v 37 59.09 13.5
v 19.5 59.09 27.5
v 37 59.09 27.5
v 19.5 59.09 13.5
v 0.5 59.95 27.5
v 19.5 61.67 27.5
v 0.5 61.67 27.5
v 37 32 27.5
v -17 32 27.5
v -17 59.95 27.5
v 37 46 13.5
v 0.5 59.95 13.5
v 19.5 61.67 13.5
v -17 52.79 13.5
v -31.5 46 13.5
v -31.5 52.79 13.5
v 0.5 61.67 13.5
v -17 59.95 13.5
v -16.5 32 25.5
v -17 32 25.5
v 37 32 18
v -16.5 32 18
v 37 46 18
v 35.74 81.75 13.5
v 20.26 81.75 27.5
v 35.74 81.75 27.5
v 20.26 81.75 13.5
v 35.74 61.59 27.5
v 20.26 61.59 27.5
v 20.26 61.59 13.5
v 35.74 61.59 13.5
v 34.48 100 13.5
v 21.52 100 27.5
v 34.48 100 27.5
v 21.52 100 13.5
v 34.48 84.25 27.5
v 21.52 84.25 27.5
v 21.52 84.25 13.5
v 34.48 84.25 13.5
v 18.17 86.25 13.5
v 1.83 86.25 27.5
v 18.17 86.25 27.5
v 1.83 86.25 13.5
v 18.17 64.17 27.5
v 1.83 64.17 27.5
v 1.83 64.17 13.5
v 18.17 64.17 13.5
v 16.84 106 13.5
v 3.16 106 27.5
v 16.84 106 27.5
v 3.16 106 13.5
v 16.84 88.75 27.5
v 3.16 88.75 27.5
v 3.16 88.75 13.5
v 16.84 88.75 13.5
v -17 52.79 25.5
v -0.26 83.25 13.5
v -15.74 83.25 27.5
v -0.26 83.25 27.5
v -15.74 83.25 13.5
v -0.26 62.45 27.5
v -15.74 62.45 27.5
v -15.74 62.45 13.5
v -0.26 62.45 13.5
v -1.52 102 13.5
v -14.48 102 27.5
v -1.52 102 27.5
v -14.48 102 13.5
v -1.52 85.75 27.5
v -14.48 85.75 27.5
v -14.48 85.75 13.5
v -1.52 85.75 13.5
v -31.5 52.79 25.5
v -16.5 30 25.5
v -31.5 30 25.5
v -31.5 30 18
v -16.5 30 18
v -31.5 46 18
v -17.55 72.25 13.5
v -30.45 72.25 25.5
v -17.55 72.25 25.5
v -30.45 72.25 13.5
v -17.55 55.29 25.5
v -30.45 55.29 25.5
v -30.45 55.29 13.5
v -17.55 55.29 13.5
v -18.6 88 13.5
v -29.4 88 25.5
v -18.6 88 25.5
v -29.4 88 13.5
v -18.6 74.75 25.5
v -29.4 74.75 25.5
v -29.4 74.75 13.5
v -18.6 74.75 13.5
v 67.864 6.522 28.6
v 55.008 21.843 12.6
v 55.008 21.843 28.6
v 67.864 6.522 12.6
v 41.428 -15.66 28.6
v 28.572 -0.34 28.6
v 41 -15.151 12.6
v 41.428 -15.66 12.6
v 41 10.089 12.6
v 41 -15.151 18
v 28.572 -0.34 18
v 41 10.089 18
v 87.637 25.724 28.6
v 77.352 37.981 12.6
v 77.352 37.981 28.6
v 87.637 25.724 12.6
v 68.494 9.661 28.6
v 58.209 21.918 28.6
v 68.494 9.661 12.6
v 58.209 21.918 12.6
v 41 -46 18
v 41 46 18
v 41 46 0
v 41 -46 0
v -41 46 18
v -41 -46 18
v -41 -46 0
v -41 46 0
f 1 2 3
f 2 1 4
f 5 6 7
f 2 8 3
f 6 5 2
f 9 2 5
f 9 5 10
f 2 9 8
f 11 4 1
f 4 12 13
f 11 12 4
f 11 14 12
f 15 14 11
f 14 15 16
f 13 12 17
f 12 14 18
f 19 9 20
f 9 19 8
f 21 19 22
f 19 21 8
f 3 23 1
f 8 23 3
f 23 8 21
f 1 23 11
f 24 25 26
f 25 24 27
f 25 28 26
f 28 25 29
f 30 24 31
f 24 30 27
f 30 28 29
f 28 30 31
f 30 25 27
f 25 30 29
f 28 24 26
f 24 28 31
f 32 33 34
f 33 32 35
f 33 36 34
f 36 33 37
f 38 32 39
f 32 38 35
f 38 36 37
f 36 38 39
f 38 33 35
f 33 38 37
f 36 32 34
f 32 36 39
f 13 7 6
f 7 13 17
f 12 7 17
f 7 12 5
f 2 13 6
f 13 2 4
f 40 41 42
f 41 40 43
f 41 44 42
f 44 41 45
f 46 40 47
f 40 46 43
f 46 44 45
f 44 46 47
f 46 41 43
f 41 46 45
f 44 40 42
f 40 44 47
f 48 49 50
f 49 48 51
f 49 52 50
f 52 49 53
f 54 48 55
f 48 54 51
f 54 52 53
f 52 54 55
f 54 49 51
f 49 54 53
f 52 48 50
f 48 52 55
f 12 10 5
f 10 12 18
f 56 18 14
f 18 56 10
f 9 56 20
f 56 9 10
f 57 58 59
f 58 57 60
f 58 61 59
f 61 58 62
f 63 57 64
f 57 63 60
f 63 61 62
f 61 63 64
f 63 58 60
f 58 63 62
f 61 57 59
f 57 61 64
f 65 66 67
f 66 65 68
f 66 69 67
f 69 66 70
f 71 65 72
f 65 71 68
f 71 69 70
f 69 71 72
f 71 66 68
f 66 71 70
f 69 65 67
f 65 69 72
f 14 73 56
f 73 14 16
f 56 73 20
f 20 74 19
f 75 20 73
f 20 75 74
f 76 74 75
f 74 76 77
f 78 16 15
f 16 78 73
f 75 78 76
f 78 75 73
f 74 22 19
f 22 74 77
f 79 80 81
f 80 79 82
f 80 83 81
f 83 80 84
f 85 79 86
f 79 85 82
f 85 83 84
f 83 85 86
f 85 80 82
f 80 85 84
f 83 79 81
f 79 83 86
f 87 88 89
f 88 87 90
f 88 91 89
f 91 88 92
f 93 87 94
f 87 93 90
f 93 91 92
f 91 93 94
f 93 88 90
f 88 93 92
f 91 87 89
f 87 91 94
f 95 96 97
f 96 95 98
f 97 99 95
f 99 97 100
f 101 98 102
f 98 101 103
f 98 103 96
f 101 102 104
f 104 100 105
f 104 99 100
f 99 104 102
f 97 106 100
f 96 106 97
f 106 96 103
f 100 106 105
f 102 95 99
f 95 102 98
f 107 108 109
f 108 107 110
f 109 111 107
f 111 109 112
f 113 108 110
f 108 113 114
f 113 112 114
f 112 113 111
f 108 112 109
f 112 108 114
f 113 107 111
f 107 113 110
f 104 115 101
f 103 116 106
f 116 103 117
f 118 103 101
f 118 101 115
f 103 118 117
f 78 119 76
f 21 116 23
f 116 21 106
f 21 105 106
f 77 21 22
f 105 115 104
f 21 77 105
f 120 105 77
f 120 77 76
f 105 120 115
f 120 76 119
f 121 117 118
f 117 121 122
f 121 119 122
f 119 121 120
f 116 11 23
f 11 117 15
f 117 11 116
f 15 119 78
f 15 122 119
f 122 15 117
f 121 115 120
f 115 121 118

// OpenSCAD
// PECHand v1 — Parametric prosthetic hand model
// Generated: 2025-01-15
// Description: Modular hand assembly with configurable palm and digits

/* [Anthropometric] */
palm_width_mm = 82;          // [50:1:120]
palm_length_mm = 92;         // [50:1:140]
palm_thickness_mm = 18;      // [10:1:40]
index_finger_length_mm = 68; // [40:1:120]
middle_finger_length_mm = 74; // [40:1:130]
ring_finger_length_mm = 70;  // [40:1:120]
pinky_finger_length_mm = 58; // [30:1:100]
thumb_length_mm = 62;        // [30:1:100]

/* [Layout] */
show_palm = true;
show_index = true;
show_middle = true;
show_ring = true;
show_pinky = true;
show_thumb = true;
show_assembled = true;
mirrored = false;

/* [Style] */
finger_shape = "box"; // ["box","cylinder"]
segment_gap_mm = 2.5; // [0:0.5:8]
finger_thickness_mm = 14; // [6:1:24]
thumb_thickness_mm = 16;  // [6:1:24]

/* [Colors] */
color_palm   = "#d9b382";
color_index  = "#4a9eff";
color_middle = "#ff6b6b";
color_ring   = "#51cf66";
color_pinky  = "#ffd43b";
color_thumb  = "#f783ac";

$fn = $preview ? 32 : 64;

finger_segment_ratios = [0.43, 0.32, 0.25];
thumb_segment_ratios  = [0.58, 0.42];

function _segment_offset(i, usable_length, segment_ratios, gap) =
    i <= 0 ? 0 :
    _segment_offset(i - 1, usable_length, segment_ratios, gap) +
    usable_length * segment_ratios[i - 1] + gap;

module palm_placeholder() {
    translate([-palm_width_mm / 2, -palm_length_mm / 2, 0])
        cube([palm_width_mm, palm_length_mm, palm_thickness_mm]);
}

module segment_shape(length, width, thickness) {
    if (finger_shape == "cylinder")
        rotate([0, 90, 0])
            cylinder(h=length, r=min(width, thickness) / 2, center=false);
    else
        cube([length, width, thickness]);
}

module segment_chain(total_length, widths, thickness, segment_ratios, gap=segment_gap_mm) {
    _n = len(segment_ratios);
    _gap_total = gap * (_n - 1);
    _usable_length = max(1, total_length - _gap_total);

    for (i = [0:_n - 1]) {
        _seg_len = _usable_length * segment_ratios[i];
        _x = _segment_offset(i, _usable_length, segment_ratios, gap);
        translate([_x, -widths[i] / 2, 0]) segment_shape(_seg_len, widths[i], thickness);
    }
}

module finger_placeholder(total_length, base_width=18, thickness=finger_thickness_mm) {
    _widths = [base_width, base_width * 0.86, base_width * 0.72];
    segment_chain(total_length, _widths, thickness, finger_segment_ratios);
}

module thumb_placeholder(total_length, base_width=20, thickness=thumb_thickness_mm) {
    _widths = [base_width, base_width * 0.8];
    segment_chain(total_length, _widths, thickness, thumb_segment_ratios);
}

module hand_layout() {
    _dir = mirrored ? -1 : 1;
    _base_y = palm_length_mm / 2 - 14;
    _x_index  =  28 * _dir;
    _x_middle =  10 * _dir;
    _x_ring   =  -8 * _dir;
    _x_pinky  = -24 * _dir;

    if (show_palm) color(color_palm) palm_placeholder();

    if (show_index) color(color_index)
        translate([_x_index, _base_y, palm_thickness_mm * 0.75])
            rotate([0, 0, 90]) finger_placeholder(index_finger_length_mm, base_width=18);

    if (show_middle) color(color_middle)
        translate([_x_middle, _base_y, palm_thickness_mm * 0.75])
            rotate([0, 0, 90]) finger_placeholder(middle_finger_length_mm, base_width=19);

    if (show_ring) color(color_ring)
        translate([_x_ring, _base_y, palm_thickness_mm * 0.75])
            rotate([0, 0, 90]) finger_placeholder(ring_finger_length_mm, base_width=18);

    if (show_pinky) color(color_pinky)
        translate([_x_pinky, _base_y - 2, palm_thickness_mm * 0.75])
            rotate([0, 0, 90]) finger_placeholder(pinky_finger_length_mm, base_width=15, thickness=12);

    if (show_thumb) color(color_thumb)
        translate([(palm_width_mm / 2 - 6) * _dir, -8, palm_thickness_mm * 0.7])
            rotate([0, 0, mirrored ? 140 : 40]) thumb_placeholder(thumb_length_mm, base_width=20);
}

module print_layout() {
    if (show_palm) color(color_palm)
        translate([-90, 0, 0]) palm_placeholder();

    if (show_index) color(color_index)
        translate([0, 34, 0]) finger_placeholder(index_finger_length_mm, base_width=18);

    if (show_middle) color(color_middle)
        translate([0, 10, 0]) finger_placeholder(middle_finger_length_mm, base_width=19);

    if (show_ring) color(color_ring)
        translate([0, -14, 0]) finger_placeholder(ring_finger_length_mm, base_width=18);

    if (show_pinky) color(color_pinky)
        translate([0, -36, 0]) finger_placeholder(pinky_finger_length_mm, base_width=15, thickness=12);

    if (show_thumb) color(color_thumb)
        translate([0, -66, 0]) thumb_placeholder(thumb_length_mm, base_width=20);
}

if (show_assembled)
    hand_layout();
else
    print_layout();
